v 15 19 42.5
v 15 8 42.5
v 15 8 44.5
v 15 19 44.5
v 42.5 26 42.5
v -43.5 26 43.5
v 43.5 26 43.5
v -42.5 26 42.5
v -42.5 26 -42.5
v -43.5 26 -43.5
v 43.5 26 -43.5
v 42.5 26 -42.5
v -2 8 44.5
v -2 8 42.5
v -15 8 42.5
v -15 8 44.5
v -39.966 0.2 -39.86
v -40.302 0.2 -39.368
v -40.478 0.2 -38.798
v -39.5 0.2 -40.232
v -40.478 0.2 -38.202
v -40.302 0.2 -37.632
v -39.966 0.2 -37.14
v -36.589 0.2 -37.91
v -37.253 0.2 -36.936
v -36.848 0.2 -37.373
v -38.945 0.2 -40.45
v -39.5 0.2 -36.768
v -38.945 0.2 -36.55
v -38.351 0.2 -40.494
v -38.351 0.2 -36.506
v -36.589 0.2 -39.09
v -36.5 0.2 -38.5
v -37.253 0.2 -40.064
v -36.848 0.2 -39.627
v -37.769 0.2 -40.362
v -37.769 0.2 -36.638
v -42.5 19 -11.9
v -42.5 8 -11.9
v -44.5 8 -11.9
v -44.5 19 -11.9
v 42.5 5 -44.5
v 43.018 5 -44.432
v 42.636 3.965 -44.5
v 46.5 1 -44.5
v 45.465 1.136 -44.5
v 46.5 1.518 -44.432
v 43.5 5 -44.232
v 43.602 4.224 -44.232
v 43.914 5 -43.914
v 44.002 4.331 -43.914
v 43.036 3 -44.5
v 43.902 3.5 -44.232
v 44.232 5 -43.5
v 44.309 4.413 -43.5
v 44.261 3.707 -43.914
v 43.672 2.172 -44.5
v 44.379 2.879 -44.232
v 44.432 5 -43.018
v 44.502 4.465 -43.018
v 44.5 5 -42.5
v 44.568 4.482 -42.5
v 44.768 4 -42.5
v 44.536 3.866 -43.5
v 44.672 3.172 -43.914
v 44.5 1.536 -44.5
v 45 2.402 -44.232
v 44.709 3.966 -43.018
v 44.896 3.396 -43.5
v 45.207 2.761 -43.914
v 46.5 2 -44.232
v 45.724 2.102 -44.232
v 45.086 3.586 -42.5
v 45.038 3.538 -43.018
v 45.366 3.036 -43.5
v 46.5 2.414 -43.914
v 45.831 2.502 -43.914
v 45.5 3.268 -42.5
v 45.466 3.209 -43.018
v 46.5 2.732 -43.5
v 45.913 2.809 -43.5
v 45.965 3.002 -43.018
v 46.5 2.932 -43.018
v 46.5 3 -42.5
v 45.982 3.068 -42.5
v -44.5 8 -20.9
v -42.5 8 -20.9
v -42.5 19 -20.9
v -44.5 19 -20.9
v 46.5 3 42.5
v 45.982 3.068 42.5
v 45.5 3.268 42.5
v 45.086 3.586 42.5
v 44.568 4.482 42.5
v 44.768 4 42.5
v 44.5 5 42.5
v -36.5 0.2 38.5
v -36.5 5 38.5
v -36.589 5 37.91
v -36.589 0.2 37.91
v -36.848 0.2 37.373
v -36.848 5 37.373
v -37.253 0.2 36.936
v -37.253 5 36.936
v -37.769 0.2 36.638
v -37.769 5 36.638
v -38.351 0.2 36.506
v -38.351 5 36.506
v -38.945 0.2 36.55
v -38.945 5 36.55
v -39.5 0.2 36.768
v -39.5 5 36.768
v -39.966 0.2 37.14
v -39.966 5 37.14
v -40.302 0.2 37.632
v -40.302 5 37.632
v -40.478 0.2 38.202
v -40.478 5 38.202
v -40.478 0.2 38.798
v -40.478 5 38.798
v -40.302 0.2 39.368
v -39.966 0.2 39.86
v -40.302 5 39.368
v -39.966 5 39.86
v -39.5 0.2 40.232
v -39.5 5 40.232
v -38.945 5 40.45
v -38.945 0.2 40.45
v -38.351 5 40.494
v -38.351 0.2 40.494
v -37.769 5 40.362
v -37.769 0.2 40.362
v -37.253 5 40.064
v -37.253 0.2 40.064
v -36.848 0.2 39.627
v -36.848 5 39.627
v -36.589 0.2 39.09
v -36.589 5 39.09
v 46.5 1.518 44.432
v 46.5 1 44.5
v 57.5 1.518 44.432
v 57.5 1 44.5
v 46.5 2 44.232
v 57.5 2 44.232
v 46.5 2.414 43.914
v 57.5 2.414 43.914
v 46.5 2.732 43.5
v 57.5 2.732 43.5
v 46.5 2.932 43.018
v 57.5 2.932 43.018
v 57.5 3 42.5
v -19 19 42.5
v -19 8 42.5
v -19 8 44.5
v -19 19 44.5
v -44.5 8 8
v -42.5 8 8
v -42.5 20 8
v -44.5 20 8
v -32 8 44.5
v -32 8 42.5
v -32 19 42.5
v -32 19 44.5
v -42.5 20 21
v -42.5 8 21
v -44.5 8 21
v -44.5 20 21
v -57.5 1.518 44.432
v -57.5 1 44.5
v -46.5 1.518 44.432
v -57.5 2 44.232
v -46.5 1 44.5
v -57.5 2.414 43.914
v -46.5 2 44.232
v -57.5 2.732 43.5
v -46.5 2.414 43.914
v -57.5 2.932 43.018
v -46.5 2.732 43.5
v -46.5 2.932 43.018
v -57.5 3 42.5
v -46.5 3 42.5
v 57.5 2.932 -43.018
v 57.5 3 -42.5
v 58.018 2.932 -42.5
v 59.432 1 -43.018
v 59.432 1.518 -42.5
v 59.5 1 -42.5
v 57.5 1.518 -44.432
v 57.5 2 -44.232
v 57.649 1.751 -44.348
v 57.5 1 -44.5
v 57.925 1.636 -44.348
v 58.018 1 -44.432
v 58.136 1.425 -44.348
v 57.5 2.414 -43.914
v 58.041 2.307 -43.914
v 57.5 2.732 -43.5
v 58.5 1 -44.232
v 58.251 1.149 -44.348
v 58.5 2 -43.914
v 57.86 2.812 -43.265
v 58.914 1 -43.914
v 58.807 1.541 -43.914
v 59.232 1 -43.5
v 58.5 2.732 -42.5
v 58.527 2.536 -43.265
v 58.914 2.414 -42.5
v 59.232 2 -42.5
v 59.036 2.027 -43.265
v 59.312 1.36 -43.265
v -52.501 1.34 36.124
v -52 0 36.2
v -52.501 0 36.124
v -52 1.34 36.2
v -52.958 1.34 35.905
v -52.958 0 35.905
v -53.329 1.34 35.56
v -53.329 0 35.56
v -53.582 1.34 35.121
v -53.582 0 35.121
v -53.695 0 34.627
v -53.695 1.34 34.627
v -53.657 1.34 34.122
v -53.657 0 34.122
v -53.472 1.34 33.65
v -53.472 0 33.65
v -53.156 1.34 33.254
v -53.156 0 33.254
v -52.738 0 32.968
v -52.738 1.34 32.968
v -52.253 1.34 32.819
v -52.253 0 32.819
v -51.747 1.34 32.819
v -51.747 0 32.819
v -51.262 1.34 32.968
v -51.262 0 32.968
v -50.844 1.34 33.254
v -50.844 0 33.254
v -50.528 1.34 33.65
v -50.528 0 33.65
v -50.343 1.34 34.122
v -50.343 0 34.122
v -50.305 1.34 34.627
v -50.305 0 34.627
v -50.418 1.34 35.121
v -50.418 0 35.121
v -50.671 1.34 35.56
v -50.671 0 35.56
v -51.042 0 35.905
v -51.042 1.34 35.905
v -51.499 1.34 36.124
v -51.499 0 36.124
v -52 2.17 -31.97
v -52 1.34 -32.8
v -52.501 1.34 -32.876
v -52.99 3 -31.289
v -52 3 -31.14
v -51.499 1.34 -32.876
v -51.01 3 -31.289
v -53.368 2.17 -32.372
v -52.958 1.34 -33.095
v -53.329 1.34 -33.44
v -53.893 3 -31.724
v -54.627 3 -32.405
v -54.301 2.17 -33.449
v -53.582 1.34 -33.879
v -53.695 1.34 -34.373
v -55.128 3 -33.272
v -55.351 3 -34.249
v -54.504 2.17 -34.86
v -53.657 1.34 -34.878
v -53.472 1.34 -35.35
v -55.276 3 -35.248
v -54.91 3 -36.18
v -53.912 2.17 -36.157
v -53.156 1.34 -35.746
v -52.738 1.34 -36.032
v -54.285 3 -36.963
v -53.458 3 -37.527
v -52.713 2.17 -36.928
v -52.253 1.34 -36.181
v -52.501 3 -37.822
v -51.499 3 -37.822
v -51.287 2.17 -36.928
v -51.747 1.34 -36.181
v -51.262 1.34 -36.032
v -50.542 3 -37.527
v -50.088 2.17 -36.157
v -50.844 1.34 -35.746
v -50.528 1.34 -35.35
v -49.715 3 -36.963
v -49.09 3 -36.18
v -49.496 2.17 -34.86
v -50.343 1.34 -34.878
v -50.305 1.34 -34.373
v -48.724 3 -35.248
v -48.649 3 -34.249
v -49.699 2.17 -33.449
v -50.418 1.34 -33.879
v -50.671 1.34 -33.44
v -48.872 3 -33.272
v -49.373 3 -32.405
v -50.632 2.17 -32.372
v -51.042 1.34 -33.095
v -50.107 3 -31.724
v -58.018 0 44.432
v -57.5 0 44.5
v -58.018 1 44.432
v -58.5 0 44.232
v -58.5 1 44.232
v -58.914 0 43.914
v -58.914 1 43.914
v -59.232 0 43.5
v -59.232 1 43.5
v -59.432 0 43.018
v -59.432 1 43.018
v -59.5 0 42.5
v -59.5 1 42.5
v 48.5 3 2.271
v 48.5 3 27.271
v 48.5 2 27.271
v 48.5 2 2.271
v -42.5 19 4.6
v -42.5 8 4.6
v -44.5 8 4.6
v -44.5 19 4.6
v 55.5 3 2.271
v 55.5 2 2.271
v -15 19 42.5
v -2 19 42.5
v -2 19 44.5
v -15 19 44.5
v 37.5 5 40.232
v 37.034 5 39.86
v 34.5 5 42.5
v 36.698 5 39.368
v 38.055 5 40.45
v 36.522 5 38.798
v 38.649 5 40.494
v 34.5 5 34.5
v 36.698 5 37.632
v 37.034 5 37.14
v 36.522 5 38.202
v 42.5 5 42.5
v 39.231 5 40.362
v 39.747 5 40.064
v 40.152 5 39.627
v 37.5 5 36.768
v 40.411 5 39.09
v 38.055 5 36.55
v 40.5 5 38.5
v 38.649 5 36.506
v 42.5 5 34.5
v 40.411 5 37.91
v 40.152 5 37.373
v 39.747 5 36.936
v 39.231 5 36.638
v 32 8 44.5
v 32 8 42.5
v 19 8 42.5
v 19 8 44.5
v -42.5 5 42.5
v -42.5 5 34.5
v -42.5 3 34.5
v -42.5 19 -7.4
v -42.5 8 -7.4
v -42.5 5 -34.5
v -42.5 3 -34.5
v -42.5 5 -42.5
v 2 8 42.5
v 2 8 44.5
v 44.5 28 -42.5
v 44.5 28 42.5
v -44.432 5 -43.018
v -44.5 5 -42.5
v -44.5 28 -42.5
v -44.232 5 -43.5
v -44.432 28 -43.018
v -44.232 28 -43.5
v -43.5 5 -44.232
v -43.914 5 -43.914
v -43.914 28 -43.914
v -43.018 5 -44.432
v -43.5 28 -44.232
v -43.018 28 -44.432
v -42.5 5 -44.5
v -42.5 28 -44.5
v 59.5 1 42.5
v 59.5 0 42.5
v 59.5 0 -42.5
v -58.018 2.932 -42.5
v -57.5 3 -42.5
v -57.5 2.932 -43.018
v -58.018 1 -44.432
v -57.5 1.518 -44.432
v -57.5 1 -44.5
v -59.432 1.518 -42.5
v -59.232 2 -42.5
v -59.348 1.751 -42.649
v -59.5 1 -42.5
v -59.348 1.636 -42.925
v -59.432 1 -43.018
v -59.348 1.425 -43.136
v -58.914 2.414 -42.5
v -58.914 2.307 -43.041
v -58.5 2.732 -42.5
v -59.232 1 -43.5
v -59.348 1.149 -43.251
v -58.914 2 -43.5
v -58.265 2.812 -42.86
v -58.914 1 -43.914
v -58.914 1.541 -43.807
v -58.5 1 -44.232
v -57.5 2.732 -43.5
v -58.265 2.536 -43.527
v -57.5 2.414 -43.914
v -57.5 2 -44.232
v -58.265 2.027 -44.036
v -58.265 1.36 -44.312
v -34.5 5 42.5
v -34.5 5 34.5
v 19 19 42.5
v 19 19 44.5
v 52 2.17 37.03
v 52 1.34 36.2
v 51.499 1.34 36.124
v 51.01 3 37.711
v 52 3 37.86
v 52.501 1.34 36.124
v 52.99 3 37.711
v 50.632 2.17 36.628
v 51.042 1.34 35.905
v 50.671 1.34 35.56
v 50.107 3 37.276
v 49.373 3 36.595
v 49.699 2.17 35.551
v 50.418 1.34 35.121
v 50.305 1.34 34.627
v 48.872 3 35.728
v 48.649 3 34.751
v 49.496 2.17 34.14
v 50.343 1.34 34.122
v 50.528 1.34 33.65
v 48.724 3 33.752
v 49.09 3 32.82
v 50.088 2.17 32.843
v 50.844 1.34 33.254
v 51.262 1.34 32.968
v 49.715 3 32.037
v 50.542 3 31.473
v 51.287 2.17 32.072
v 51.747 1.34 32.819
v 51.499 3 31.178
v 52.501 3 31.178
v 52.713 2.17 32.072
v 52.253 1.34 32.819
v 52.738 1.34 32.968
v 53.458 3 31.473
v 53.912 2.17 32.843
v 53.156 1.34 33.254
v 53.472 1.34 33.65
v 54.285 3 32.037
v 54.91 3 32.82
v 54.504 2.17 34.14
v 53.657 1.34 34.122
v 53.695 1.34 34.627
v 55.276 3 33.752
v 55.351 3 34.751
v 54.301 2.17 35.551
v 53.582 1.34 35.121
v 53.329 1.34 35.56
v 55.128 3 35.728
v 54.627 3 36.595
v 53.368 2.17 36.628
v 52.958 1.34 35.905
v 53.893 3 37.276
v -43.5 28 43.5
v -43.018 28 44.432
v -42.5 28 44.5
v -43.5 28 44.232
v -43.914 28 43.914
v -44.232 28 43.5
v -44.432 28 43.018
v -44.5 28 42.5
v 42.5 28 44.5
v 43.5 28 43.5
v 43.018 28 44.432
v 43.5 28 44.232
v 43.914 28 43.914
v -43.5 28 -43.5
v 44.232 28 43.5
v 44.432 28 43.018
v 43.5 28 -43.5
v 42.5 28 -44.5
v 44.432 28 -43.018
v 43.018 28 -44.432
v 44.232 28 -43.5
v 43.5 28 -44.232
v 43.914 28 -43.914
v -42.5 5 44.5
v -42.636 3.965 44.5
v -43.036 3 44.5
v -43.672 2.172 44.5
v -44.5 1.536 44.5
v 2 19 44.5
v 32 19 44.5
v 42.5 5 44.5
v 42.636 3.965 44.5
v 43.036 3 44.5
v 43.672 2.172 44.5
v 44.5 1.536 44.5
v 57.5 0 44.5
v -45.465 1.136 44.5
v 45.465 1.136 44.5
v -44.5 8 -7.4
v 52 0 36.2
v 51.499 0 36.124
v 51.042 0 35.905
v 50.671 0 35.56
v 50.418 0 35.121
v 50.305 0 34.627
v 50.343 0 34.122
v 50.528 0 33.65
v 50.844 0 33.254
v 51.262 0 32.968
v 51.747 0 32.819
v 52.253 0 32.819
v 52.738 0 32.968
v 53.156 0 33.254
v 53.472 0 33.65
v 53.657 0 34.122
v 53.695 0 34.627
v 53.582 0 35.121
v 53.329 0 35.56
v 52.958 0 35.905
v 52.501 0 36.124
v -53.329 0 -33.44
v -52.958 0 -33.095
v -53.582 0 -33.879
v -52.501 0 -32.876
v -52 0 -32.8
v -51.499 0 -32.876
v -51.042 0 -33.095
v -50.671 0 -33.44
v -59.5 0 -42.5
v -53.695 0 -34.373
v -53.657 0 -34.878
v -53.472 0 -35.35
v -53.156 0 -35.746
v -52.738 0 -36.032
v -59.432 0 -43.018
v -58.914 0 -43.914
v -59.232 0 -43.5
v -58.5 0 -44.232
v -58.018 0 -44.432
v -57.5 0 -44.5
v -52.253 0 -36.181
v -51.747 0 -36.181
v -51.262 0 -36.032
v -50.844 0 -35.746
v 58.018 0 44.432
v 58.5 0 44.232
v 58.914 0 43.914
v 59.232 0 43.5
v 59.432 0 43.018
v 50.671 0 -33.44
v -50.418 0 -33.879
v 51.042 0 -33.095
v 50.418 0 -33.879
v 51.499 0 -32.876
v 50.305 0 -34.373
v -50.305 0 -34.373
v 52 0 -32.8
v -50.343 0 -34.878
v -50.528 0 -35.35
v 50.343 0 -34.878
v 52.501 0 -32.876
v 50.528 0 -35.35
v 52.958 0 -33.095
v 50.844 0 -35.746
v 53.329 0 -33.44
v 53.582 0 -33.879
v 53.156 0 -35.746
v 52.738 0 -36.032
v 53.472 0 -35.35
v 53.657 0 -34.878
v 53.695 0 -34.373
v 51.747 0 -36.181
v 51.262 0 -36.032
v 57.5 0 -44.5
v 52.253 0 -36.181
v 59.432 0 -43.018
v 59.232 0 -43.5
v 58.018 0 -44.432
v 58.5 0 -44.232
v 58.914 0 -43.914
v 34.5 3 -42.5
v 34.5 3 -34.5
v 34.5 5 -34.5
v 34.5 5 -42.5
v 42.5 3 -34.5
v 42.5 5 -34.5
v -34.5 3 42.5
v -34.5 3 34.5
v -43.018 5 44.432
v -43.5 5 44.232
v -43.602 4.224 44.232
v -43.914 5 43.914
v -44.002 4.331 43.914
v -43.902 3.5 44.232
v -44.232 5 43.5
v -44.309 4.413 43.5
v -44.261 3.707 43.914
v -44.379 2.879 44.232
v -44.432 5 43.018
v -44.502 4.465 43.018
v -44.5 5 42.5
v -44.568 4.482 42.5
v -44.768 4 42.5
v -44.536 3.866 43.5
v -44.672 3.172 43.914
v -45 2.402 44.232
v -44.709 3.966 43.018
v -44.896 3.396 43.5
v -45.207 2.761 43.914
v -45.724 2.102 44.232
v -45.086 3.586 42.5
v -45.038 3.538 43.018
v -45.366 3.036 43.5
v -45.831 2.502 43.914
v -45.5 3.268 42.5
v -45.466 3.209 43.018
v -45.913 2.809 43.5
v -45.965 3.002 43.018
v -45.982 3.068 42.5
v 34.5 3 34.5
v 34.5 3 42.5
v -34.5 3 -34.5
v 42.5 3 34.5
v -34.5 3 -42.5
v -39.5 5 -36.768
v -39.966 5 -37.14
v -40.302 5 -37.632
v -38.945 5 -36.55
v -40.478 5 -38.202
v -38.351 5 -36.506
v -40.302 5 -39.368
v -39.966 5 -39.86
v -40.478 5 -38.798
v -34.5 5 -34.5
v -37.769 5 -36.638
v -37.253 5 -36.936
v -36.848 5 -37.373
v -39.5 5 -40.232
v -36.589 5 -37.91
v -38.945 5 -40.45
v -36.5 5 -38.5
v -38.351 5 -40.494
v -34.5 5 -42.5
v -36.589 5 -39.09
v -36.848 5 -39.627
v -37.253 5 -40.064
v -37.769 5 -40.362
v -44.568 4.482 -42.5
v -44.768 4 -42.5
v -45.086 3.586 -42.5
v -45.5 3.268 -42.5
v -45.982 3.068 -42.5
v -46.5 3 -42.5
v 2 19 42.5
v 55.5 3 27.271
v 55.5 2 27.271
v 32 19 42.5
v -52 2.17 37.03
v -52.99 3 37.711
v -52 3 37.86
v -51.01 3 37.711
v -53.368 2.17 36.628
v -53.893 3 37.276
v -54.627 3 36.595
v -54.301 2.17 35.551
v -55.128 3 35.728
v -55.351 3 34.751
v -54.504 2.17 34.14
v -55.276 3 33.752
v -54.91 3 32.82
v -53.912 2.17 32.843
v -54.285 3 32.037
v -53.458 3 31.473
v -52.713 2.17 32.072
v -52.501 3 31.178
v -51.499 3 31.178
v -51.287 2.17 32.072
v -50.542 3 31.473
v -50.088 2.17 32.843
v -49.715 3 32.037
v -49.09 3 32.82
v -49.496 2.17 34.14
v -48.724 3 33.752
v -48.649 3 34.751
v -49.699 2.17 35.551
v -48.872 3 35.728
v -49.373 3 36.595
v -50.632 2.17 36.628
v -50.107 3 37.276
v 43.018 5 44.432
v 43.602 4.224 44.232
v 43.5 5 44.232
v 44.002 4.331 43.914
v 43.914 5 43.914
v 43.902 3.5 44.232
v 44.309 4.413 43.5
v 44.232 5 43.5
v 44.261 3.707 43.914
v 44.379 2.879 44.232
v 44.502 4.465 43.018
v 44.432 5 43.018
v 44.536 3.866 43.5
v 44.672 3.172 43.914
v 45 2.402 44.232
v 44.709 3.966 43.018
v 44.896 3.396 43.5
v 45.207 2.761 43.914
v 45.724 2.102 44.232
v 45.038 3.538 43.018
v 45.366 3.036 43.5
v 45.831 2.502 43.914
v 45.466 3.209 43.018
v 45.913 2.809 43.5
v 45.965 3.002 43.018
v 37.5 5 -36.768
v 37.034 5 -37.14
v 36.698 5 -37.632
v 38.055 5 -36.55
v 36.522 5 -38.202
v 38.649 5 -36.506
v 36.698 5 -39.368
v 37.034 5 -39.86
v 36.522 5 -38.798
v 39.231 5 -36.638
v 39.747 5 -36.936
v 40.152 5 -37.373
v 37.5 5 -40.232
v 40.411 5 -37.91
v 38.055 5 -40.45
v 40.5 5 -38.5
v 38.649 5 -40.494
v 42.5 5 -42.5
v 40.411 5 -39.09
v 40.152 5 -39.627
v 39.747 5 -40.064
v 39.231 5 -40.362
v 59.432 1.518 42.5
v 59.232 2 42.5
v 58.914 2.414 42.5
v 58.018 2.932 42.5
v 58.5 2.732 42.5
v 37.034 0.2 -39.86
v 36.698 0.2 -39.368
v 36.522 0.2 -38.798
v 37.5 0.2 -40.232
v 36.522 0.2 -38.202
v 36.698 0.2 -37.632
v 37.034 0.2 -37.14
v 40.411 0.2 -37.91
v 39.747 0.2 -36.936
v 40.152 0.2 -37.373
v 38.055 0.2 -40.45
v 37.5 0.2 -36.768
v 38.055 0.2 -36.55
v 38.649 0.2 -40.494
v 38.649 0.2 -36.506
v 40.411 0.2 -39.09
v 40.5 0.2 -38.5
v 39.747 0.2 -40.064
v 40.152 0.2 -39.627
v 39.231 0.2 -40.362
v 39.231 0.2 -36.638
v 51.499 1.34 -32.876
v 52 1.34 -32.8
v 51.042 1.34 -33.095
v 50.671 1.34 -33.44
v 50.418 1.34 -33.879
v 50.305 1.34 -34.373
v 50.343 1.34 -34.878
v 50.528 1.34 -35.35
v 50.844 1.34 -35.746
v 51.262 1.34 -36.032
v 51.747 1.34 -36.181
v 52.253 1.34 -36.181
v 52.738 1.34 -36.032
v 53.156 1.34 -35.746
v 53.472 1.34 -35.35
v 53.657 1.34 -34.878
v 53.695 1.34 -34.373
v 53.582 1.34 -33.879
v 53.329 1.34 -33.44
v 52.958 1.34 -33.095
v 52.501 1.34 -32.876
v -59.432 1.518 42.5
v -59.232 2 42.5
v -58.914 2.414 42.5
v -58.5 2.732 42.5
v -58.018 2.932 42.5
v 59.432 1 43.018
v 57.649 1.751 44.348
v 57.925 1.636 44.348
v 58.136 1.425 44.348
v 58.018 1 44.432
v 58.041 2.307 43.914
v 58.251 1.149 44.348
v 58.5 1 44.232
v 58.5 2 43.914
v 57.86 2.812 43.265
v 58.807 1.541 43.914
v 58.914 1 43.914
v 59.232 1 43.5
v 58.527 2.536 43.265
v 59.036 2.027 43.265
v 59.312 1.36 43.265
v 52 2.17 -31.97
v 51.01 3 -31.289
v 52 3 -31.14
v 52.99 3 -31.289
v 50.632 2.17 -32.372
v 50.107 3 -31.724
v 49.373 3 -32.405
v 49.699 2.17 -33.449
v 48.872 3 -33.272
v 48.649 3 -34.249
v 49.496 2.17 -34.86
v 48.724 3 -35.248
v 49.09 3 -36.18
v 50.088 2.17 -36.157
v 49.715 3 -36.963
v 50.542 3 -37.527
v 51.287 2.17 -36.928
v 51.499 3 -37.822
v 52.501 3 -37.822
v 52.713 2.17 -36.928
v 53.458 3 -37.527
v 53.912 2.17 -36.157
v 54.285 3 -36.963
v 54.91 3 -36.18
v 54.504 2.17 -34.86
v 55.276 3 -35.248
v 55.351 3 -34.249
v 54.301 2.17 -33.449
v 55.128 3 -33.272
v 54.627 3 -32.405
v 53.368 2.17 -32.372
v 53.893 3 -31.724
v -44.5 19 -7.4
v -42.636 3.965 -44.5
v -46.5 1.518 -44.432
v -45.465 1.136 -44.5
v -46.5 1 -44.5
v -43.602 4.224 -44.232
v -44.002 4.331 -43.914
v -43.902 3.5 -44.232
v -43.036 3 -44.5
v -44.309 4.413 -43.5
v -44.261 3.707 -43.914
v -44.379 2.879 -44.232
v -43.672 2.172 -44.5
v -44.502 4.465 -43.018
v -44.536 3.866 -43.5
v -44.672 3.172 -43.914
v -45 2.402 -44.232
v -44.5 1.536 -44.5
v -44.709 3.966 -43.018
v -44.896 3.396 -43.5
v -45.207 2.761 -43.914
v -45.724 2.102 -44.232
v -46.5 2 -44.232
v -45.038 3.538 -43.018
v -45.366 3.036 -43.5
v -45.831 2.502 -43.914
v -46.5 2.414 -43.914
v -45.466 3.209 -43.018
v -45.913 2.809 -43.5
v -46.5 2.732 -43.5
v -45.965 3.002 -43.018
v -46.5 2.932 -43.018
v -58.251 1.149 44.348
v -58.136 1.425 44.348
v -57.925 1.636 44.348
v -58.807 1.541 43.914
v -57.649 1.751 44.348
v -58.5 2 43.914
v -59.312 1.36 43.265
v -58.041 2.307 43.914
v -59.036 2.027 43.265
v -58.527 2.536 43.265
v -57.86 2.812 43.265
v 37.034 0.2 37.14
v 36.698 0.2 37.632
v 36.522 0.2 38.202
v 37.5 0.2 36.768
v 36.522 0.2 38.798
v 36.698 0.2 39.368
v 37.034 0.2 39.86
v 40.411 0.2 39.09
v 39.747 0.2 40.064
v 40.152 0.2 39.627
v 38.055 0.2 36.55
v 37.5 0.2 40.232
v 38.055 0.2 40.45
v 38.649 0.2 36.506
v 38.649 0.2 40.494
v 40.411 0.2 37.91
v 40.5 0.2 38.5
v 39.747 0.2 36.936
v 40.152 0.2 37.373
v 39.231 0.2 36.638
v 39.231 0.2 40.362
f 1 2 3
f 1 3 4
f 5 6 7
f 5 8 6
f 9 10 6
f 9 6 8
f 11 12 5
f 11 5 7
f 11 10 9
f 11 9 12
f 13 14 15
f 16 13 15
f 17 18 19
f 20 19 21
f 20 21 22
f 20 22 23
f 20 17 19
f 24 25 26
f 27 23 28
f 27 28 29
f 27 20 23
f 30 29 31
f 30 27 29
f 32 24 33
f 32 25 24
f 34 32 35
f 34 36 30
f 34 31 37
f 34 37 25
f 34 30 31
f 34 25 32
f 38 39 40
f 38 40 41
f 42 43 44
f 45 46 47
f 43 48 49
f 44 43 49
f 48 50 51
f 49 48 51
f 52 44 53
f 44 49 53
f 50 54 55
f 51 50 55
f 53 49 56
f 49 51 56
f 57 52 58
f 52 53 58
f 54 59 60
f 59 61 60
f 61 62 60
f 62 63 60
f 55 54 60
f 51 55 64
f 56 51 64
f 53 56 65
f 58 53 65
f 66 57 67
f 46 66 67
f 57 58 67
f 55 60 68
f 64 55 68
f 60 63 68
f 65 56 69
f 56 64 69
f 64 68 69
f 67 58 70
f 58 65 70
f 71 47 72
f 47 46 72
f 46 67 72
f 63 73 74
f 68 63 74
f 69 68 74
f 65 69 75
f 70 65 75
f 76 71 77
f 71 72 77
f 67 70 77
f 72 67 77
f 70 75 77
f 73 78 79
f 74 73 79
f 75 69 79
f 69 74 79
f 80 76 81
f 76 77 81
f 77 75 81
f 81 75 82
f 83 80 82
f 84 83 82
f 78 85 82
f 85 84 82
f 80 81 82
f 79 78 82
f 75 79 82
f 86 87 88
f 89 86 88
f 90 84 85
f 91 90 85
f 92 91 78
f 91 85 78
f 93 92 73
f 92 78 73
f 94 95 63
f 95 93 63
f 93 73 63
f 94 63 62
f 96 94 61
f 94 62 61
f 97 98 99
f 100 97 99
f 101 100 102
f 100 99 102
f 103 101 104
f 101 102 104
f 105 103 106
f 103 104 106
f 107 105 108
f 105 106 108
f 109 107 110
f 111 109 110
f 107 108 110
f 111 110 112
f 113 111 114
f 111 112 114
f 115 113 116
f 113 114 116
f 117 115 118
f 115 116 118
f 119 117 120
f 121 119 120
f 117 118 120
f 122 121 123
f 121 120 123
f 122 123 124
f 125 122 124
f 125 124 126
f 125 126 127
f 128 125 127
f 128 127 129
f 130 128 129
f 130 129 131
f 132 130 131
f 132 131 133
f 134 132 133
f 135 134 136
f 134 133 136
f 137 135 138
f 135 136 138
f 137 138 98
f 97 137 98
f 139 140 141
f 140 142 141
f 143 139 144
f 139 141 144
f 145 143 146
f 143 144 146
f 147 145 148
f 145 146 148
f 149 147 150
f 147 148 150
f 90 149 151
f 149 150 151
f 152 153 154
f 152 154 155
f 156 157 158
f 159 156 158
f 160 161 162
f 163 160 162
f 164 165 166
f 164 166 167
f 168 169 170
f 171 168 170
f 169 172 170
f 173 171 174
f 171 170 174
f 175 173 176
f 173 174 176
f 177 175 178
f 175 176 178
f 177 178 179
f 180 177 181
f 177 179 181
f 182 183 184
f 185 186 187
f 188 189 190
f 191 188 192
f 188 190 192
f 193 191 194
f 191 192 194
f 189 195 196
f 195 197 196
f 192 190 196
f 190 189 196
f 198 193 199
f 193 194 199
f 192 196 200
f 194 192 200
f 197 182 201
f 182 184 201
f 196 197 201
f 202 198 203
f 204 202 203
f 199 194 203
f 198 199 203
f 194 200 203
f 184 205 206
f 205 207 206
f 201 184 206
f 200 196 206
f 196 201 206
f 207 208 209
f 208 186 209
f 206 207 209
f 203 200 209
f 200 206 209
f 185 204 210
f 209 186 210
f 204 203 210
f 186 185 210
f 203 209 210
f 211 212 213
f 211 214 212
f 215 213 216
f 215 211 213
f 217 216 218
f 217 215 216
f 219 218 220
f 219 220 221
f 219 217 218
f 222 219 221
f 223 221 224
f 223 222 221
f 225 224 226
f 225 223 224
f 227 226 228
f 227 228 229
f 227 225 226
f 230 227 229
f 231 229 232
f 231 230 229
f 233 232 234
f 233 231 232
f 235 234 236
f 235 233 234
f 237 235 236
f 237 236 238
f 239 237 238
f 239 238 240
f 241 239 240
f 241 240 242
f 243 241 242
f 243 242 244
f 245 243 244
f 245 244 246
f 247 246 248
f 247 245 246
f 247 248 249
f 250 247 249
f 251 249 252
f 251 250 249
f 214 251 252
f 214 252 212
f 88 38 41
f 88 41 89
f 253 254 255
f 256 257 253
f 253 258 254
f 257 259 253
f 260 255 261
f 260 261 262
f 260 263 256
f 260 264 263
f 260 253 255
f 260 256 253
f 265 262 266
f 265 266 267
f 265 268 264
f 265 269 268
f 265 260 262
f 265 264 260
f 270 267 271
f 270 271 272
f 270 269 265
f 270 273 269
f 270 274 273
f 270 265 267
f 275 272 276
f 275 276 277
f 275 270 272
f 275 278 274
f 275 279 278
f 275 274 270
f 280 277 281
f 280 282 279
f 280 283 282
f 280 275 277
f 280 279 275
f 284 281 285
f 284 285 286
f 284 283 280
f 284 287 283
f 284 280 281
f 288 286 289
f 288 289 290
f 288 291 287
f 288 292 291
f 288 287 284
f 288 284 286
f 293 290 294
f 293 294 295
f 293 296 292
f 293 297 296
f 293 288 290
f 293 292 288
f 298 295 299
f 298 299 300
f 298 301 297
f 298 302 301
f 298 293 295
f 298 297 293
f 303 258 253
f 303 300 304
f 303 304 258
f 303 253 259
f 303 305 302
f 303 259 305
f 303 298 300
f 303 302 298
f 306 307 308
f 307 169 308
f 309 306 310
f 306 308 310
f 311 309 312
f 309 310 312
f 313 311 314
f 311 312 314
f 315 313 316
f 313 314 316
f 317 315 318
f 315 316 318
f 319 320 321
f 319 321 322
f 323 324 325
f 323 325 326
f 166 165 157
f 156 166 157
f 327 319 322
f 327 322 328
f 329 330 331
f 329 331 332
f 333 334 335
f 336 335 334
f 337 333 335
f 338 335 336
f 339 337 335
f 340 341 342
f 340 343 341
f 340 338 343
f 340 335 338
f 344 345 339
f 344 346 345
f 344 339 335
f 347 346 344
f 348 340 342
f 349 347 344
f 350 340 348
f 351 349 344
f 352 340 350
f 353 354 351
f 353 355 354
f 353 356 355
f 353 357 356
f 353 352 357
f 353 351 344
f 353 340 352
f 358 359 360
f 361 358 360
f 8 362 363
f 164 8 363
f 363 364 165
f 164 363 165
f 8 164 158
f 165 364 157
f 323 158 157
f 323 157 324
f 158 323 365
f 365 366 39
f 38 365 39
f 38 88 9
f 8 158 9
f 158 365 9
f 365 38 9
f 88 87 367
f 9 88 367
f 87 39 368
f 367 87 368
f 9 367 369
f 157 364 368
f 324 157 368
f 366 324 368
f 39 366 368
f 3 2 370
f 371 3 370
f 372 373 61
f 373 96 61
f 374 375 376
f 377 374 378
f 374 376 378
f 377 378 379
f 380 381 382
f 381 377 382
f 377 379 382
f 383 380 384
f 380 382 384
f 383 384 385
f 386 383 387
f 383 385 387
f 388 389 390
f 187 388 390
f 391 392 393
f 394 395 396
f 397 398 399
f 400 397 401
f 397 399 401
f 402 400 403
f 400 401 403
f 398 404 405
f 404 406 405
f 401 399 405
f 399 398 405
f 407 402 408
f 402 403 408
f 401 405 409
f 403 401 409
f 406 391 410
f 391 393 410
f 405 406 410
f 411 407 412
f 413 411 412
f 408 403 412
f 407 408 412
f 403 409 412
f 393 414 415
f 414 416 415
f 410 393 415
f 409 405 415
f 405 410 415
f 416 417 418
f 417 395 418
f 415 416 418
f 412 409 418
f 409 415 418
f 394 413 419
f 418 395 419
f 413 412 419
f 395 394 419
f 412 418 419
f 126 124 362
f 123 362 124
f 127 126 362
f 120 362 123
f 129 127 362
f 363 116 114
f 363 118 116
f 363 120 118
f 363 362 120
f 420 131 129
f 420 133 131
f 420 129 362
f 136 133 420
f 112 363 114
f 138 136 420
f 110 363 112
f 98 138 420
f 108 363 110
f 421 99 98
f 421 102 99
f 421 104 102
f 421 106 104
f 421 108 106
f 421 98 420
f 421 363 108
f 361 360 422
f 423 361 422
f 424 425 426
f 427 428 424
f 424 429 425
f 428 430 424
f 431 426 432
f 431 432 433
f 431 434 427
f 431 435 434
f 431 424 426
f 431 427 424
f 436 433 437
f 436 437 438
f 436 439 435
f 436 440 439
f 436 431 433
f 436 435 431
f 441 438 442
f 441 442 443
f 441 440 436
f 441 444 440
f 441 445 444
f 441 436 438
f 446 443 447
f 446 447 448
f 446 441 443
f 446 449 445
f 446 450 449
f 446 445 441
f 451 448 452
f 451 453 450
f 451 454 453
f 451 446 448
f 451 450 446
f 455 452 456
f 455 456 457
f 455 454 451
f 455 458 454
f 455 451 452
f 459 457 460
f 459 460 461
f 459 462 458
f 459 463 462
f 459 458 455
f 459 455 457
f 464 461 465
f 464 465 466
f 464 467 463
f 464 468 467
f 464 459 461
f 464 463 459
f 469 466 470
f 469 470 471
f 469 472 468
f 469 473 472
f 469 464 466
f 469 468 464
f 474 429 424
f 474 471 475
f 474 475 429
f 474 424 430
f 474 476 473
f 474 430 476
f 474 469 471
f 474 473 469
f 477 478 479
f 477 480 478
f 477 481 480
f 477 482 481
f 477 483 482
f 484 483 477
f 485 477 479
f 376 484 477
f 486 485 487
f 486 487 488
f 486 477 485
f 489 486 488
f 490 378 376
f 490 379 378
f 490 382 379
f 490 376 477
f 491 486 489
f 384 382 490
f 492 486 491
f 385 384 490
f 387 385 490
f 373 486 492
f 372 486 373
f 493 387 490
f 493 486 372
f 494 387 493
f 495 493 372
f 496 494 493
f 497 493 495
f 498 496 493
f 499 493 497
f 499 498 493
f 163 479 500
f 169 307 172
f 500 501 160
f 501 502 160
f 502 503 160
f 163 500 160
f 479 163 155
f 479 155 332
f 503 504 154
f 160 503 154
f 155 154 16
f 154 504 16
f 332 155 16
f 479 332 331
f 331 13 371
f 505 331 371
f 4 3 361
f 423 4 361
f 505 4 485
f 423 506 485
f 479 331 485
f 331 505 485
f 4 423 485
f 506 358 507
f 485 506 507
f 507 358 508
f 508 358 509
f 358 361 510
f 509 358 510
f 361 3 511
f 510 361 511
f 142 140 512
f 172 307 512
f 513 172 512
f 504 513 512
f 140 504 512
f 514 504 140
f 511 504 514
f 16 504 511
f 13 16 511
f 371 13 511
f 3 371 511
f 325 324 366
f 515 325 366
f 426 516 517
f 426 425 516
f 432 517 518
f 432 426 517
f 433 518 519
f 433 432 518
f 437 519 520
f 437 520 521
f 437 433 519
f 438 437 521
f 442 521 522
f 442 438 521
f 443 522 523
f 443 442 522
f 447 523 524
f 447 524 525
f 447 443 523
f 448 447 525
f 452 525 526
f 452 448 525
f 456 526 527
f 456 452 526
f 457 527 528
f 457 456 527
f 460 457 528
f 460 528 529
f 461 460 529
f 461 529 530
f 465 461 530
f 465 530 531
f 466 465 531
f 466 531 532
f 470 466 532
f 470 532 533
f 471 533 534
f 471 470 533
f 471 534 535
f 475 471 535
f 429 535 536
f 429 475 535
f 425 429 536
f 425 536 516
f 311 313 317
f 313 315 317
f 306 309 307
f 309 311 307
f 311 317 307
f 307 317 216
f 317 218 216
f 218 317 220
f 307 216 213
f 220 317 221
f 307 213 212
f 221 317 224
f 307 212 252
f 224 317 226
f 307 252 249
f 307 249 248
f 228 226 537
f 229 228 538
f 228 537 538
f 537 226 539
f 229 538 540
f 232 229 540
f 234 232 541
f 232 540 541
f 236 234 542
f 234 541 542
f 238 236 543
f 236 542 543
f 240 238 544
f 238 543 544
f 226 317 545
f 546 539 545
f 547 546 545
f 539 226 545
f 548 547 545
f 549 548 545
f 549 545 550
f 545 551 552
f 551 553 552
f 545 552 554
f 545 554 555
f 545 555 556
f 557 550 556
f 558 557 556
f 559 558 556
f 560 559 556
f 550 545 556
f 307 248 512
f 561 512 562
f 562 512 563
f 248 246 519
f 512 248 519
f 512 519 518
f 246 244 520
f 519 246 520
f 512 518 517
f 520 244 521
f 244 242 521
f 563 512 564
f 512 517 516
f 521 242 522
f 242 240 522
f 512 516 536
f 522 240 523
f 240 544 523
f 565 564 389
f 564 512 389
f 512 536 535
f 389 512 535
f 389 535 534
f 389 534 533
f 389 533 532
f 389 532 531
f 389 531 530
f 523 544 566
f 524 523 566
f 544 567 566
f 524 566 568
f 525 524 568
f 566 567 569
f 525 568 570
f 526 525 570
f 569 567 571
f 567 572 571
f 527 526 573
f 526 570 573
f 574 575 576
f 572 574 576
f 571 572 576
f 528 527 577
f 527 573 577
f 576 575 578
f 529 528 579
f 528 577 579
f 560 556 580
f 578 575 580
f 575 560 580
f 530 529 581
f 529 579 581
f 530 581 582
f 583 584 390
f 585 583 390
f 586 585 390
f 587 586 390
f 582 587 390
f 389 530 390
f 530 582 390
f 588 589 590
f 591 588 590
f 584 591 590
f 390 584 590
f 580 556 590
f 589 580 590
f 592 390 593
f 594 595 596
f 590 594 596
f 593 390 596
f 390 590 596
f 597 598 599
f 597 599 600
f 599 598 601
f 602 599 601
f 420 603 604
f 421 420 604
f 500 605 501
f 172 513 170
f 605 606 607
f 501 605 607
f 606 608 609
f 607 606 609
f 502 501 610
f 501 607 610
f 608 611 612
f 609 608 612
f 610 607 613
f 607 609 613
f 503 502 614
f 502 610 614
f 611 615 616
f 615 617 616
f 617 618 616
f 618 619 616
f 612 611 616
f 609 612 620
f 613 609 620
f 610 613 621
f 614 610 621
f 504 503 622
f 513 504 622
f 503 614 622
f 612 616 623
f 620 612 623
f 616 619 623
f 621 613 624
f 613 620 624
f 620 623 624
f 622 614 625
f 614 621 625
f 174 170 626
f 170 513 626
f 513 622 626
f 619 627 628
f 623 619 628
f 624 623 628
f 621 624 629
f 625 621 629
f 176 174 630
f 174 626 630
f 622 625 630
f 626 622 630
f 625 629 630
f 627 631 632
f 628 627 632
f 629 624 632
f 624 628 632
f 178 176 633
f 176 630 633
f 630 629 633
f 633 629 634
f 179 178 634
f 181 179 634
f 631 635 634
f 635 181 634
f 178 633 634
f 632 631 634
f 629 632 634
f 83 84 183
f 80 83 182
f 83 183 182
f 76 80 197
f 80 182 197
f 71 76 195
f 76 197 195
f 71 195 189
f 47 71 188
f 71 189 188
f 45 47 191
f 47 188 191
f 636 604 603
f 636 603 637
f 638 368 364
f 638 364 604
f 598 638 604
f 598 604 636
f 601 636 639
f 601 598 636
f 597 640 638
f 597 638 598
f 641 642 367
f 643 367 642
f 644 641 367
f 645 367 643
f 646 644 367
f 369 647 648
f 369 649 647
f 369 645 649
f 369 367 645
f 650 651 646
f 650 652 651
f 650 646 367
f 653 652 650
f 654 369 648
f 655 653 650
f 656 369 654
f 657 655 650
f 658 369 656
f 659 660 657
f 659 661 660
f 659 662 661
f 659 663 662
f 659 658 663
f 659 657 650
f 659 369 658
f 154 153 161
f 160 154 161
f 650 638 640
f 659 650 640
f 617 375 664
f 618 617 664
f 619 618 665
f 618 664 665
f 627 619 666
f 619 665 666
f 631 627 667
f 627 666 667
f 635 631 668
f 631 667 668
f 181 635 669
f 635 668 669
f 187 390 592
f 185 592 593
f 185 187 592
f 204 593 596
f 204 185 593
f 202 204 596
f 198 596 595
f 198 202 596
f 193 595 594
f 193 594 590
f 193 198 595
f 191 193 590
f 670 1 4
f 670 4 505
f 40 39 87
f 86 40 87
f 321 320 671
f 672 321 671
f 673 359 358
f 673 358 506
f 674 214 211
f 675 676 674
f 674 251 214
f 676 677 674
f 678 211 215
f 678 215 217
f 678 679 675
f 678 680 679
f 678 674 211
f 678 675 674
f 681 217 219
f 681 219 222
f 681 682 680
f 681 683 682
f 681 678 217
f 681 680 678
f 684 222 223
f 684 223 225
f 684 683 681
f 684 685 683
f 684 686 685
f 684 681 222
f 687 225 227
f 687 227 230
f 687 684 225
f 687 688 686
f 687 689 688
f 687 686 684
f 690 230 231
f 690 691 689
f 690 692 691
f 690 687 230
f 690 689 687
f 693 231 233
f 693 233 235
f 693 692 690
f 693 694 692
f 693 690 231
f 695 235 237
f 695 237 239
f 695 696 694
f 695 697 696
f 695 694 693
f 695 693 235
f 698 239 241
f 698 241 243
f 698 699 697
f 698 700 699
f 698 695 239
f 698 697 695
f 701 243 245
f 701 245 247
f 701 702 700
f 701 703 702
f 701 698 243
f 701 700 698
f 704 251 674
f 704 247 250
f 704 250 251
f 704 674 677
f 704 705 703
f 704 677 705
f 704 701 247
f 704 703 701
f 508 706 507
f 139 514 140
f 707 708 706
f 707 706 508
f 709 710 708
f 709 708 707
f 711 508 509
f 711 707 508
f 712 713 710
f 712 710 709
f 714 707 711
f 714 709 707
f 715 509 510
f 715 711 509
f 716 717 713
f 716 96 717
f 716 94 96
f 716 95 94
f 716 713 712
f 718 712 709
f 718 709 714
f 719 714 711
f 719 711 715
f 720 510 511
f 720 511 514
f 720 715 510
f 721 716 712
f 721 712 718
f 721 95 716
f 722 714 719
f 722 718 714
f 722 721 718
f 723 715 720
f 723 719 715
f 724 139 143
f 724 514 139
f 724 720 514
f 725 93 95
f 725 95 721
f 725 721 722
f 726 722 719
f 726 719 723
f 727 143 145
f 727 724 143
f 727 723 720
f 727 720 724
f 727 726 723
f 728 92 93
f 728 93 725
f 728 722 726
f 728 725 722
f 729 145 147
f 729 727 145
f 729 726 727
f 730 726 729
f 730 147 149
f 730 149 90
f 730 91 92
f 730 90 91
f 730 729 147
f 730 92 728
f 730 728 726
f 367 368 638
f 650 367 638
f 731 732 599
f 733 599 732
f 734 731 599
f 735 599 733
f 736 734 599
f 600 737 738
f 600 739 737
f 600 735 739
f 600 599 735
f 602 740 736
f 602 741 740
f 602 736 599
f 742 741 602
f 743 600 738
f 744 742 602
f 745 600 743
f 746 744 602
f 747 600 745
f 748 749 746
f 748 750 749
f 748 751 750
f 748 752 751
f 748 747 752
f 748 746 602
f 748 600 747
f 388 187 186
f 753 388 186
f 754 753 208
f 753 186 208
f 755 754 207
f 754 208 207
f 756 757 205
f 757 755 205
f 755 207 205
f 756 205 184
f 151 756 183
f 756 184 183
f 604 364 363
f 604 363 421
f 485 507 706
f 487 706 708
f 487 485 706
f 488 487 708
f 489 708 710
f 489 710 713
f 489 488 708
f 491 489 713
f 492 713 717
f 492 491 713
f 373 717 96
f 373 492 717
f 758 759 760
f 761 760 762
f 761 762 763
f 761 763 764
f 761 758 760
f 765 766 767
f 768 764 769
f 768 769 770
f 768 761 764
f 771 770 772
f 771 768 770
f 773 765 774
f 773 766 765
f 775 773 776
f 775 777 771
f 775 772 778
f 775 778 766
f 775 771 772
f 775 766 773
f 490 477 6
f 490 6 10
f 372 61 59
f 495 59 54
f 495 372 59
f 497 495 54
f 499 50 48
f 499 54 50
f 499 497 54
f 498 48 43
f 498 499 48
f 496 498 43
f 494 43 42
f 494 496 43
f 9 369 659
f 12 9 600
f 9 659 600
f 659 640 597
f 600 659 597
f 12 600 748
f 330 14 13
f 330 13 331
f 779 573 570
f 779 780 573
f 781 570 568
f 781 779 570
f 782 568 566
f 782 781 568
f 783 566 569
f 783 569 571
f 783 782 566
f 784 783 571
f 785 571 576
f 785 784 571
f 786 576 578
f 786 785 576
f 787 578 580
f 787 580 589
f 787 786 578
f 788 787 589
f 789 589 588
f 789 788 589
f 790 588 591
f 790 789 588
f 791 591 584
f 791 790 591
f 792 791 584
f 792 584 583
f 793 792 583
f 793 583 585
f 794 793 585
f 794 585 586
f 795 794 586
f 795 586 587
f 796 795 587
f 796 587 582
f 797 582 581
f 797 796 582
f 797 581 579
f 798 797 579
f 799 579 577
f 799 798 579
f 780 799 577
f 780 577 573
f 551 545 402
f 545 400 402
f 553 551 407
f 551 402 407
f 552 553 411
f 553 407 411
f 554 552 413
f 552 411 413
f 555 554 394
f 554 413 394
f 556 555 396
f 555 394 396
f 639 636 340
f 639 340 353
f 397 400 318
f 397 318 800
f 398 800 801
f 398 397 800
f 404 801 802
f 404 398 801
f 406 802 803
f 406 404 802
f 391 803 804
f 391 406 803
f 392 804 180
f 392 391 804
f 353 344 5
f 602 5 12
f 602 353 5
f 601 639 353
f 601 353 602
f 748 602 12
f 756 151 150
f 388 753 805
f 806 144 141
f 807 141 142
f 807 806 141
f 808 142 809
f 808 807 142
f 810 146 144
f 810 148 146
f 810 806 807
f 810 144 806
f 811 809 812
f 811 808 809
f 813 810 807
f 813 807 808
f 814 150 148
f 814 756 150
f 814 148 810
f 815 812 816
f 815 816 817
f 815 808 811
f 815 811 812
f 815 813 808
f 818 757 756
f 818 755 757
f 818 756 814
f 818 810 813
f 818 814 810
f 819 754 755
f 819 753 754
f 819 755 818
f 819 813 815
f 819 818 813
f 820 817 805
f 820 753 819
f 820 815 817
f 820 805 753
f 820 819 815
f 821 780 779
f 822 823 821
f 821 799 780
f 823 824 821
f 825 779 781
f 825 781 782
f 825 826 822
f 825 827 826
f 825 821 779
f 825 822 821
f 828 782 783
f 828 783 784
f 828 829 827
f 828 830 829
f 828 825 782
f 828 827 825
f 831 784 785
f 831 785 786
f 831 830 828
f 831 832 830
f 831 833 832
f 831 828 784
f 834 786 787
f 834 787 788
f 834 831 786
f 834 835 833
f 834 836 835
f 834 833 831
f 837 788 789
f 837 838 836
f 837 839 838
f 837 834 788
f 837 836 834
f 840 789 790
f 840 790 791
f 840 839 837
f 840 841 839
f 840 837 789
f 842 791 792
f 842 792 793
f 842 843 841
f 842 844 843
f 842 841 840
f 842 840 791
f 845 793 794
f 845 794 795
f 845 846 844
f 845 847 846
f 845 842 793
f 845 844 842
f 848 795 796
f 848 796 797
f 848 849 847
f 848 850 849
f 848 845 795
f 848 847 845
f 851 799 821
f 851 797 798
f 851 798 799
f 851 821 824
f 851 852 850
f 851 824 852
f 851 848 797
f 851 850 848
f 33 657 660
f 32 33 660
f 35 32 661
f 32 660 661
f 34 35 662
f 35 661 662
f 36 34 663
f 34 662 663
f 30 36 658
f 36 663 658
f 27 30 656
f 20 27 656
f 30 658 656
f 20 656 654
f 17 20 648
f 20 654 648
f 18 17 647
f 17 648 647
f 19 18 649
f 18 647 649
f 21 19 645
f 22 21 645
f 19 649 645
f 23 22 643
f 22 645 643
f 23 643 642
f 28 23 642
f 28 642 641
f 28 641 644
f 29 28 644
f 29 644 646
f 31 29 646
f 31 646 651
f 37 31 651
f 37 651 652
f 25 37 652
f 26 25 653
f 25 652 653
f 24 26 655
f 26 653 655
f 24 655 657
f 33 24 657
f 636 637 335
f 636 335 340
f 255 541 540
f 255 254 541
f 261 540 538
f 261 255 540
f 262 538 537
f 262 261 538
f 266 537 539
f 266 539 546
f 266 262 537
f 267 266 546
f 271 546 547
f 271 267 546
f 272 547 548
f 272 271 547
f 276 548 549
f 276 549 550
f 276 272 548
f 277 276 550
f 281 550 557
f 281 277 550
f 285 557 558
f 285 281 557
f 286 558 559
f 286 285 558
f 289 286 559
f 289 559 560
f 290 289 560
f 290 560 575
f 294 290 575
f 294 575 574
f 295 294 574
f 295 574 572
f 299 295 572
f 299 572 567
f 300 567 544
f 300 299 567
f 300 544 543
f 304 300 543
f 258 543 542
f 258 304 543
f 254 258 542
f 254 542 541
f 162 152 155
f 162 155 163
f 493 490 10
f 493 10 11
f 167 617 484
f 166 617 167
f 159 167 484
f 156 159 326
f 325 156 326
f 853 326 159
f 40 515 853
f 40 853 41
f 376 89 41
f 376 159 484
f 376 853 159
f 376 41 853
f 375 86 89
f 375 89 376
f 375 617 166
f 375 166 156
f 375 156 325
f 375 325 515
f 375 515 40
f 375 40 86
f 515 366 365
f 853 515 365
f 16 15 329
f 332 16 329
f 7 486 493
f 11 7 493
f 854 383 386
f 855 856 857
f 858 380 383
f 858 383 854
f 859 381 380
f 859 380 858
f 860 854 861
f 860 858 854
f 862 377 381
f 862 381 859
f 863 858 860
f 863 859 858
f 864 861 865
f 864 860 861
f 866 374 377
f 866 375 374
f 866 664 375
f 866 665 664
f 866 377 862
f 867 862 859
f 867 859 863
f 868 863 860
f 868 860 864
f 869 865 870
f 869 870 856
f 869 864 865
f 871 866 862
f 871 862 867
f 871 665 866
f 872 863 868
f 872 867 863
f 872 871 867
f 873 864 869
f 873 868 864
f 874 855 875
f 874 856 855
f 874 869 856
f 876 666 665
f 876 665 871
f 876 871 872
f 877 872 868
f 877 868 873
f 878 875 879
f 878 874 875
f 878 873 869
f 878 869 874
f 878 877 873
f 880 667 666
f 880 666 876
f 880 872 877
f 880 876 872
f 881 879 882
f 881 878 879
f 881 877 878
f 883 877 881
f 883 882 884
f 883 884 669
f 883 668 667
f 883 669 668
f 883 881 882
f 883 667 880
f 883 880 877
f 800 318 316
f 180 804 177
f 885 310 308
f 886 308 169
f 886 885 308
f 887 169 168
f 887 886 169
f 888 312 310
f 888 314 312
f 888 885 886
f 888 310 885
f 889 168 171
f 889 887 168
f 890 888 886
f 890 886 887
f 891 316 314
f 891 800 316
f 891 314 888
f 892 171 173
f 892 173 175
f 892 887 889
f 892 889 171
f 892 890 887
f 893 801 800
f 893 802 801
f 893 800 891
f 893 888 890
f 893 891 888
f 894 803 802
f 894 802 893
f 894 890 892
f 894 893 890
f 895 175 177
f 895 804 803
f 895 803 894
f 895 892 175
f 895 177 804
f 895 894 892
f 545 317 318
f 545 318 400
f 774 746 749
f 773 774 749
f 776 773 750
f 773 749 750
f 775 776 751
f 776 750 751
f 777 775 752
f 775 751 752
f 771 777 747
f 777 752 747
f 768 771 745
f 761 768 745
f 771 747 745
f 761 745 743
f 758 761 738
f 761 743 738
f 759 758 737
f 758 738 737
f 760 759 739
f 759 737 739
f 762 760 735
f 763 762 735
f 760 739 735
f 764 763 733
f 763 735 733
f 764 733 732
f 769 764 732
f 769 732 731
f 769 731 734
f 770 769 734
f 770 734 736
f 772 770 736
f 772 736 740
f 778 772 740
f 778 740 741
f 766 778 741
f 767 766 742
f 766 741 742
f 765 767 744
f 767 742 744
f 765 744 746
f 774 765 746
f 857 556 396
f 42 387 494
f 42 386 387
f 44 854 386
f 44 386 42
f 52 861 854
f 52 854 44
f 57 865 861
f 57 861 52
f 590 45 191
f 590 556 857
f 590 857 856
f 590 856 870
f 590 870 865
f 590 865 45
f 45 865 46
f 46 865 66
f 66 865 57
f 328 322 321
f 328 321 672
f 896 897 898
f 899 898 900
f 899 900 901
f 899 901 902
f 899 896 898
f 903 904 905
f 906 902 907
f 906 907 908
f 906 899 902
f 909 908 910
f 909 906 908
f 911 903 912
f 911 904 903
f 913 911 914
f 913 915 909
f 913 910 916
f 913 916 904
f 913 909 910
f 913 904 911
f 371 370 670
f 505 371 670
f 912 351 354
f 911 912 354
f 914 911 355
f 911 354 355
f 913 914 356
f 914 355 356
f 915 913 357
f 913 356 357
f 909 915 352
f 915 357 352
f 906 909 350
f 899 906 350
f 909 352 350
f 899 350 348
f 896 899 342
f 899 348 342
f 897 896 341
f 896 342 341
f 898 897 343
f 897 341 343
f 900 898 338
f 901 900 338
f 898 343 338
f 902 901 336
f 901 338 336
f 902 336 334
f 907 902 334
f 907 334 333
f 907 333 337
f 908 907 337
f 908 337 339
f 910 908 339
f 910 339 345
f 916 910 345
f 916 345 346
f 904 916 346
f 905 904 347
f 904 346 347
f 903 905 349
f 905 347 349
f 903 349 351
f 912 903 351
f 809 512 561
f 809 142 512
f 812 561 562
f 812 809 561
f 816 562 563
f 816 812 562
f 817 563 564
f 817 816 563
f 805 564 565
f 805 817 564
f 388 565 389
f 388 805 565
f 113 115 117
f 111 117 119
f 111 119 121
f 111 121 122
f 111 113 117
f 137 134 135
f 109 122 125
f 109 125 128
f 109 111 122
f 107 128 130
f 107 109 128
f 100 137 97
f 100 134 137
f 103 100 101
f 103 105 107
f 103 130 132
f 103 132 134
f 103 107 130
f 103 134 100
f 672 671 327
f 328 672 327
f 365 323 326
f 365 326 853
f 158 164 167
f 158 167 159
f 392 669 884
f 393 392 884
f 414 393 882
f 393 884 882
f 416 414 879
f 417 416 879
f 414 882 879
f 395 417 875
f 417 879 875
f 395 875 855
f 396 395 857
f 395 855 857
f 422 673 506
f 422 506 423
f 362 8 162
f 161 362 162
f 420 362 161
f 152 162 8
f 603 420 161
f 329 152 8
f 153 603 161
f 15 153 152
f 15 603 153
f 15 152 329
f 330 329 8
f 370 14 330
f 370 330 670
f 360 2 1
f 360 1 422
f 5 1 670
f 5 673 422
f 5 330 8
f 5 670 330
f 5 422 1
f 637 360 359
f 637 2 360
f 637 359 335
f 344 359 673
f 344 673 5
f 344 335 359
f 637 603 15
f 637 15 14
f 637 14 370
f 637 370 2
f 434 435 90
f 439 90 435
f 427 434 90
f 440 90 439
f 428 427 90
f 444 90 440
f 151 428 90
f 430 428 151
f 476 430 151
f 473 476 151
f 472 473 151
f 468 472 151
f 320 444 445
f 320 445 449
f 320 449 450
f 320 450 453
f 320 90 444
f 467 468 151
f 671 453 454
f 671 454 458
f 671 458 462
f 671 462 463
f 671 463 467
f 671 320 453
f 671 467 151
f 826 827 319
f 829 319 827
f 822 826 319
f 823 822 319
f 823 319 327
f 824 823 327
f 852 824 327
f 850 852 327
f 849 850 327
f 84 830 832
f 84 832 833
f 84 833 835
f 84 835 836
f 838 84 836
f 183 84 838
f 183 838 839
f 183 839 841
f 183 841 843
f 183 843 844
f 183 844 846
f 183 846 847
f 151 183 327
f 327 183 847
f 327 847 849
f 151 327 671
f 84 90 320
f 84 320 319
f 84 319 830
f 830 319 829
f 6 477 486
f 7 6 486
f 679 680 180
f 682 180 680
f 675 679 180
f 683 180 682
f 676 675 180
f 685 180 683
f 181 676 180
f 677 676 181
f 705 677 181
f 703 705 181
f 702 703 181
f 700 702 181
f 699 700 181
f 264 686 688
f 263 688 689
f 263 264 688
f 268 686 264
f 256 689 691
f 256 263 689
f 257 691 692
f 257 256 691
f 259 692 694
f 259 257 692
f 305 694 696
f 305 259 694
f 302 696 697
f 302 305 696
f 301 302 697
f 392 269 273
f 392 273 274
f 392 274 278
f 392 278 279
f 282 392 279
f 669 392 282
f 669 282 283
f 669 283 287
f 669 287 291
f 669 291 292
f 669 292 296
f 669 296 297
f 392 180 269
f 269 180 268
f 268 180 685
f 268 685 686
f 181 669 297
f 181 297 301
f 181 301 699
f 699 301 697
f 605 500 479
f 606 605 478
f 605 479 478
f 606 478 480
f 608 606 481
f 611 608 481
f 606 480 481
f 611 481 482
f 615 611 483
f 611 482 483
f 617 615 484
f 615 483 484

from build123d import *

# Parameters (mm, degrees)
SKETCH1_W                    = 119
SKETCH1_H                    = 89
BOSS_EXTRUDE2_DEPTH          = 3
SKETCH3_W                    = 89
SKETCH3_H                    = 89
SKETCH3_W_2                  = 85
SKETCH3_H_2                  = 85
BOSS_EXTRUDE3_DEPTH          = 25
SKETCH4_W                    = 87
SKETCH4_H                    = 87
CUT_EXTRUDE1_DEPTH           = 2
SKETCH6_W                    = 8
SKETCH6_H                    = 8
BOSS_EXTRUDE4_DEPTH          = 2
SKETCH7_R                    = 2
CUT_EXTRUDE2_DEPTH           = 4.8
SKETCH8_W                    = 9
SKETCH8_H                    = 11
SKETCH8_W_2                  = 12
SKETCH8_W_3                  = 13
SKETCH8_H_2                  = 12
CUT_EXTRUDE3_DEPTH           = 2
SKETCH9_W                    = 13
SKETCH9_H                    = 11
CUT_EXTRUDE4_DEPTH           = 2
SKETCH10_R                   = 1.6
CUT_EXTRUDE5_DEPTH           = 3
SKETCH11_W                   = 7
SKETCH11_H                   = 25
CUT_EXTRUDE6_DEPTH           = 1
FILLET2_R                    = 2
CSK_FOR_M3_SFHCS1_AT_2_COUNT = 2
CSK_FOR_M3_SFHCS1_AT_2_PITCH = 69
CSK_FOR_M3_SFHCS1_AT_3_COUNT = 2
CSK_FOR_M3_SFHCS1_AT_3_PITCH = 124.807852317
CSK_FOR_M3_SFHCS1_AT_4_COUNT = 2
CSK_FOR_M3_SFHCS1_AT_4_PITCH = 104


with BuildPart() as part:
    # Sketch1 → Boss-Extrude2 (new body)
    with BuildSketch(Plane(origin=(0, 0, 0), x_dir=(1, 0, 0), z_dir=(0, 1, 0))):
        Rectangle(SKETCH1_W, SKETCH1_H)
    extrude(amount=BOSS_EXTRUDE2_DEPTH)

    # Sketch3 → Boss-Extrude3 (add)
    with BuildSketch(Plane(origin=(0, 3, 0), x_dir=(1, 0, 0), z_dir=(0, 1, 0))):
        Rectangle(SKETCH3_W, SKETCH3_H)
        Rectangle(SKETCH3_W_2, SKETCH3_H_2, mode=Mode.SUBTRACT)
    extrude(amount=BOSS_EXTRUDE3_DEPTH)

    # Sketch4 → Cut-Extrude1 (cut)
    with BuildSketch(Plane(origin=(0, 28, 0), x_dir=(1, 0, 0), z_dir=(0, 1, 0))):
        Rectangle(SKETCH4_W, SKETCH4_H)
    extrude(amount=-CUT_EXTRUDE1_DEPTH, mode=Mode.SUBTRACT)

    # Sketch6 → Boss-Extrude4 (add)
    with BuildSketch(Plane(origin=(0, 3, 0), x_dir=(1, 0, 0), z_dir=(0, 1, 0))):
        with Locations((-38.5, -38.5)):
            Rectangle(SKETCH6_W, SKETCH6_H)
        with Locations((-38.5, 38.5)):
            Rectangle(SKETCH6_W, SKETCH6_H)
        with Locations((38.5, 38.5)):
            Rectangle(SKETCH6_W, SKETCH6_H)
        with Locations((38.5, -38.5)):
            Rectangle(SKETCH6_W, SKETCH6_H)
    extrude(amount=BOSS_EXTRUDE4_DEPTH)

    # Sketch7 → Cut-Extrude2 (cut)
    with BuildSketch(Plane(origin=(0, 5, 0), x_dir=(1, 0, 0), z_dir=(0, 1, 0))):
        with Locations((-38.5, 38.5)):
            Circle(SKETCH7_R)
        with Locations((38.5, 38.5)):
            Circle(SKETCH7_R)
        with Locations((-38.5, -38.5)):
            Circle(SKETCH7_R)
        with Locations((38.5, -38.5)):
            Circle(SKETCH7_R)
    extrude(amount=-CUT_EXTRUDE2_DEPTH, mode=Mode.SUBTRACT)

    # Sketch8 → Cut-Extrude3 (cut)
    with BuildSketch(Plane(origin=(-42.5, 0, 0), x_dir=(0, 0, -1), z_dir=(1, 0, 0))):
        with Locations((16.4, 13.5)):
            Rectangle(SKETCH8_W, SKETCH8_H)
        with Locations((1.4, 13.5)):
            Rectangle(SKETCH8_W_2, SKETCH8_H)
        with Locations((-14.5, 14)):
            Rectangle(SKETCH8_W_3, SKETCH8_H_2)
    extrude(amount=-CUT_EXTRUDE3_DEPTH, mode=Mode.SUBTRACT)

    # Sketch9 → Cut-Extrude4 (cut)
    with BuildSketch(Plane(origin=(0, 0, 42.5), x_dir=(-1, 0, 0), z_dir=(0, 0, -1))):
        with Locations((8.5, 13.5)):
            Rectangle(SKETCH9_W, SKETCH9_H)
        with Locations((25.5, 13.5)):
            Rectangle(SKETCH9_W, SKETCH9_H)
        with Locations((-8.5, 13.5)):
            Rectangle(SKETCH9_W, SKETCH9_H)
        with Locations((-25.5, 13.5)):
            Rectangle(SKETCH9_W, SKETCH9_H)
    extrude(amount=-CUT_EXTRUDE4_DEPTH, mode=Mode.SUBTRACT)

    # Sketch10 → Cut-Extrude5 (cut)
    with BuildSketch(Plane(origin=(0, 3, 0), x_dir=(1, 0, 0), z_dir=(0, 1, 0))):
        with Locations((-52, 34.5)):
            Circle(SKETCH10_R)
        with Locations((-52, -34.5)):
            Circle(SKETCH10_R)
        with Locations((52, 34.5)):
            Circle(SKETCH10_R)
        with Locations((52, -34.5)):
            Circle(SKETCH10_R)
    extrude(amount=-CUT_EXTRUDE5_DEPTH, mode=Mode.SUBTRACT)

    # Sketch11 → Cut-Extrude6 (cut)
    with BuildSketch(Plane(origin=(0, 3, 0), x_dir=(1, 0, 0), z_dir=(0, 1, 0))):
        with Locations((52, -14.77145541)):
            Rectangle(SKETCH11_W, SKETCH11_H)
    extrude(amount=-CUT_EXTRUDE6_DEPTH, mode=Mode.SUBTRACT)

    # Fillet2
    fillet2_edges = [part.edges().sort_by_distance(p)[0] for p in [
        (59.5, 3, 0),
        (52, 3, 44.5),
        (-52, 3, -44.5),
        (52, 3, -44.5),
        (-44.5, 3, 0),
        (-44.5, 15.5, -44.5),
        (-44.5, 15.5, 44.5),
        (44.5, 3, 0),
        (44.5, 15.5, 44.5),
        (44.5, 15.5, -44.5),
        (-59.5, 3, 0),
        (-59.5, 1.5, -44.5),
        (59.5, 1.5, -44.5),
        (59.5, 1.5, 44.5),
        (-59.5, 1.5, 44.5),
        (-52, 3, 44.5),
    ]]
    fillet(fillet2_edges, radius=FILLET2_R)

    # Sketch13 → CSK for M3 SFHCS1 (revolve, cut)
    with BuildSketch(Plane(origin=(52, 3, -34.5), x_dir=(0, 0, 1), z_dir=(1, 0, 0))):
        Polygon((0, 0), (0, 3), (1.7, 3), (1.7, 1.66), (3.36, 0), align=None)
    csk_for_m3_sfhcs1 = revolve(axis=Axis((52, 9.35, -34.5), (0, -1, 0)), mode=Mode.SUBTRACT)

    # CSK for M3 SFHCS1 at 2: CSK for M3 SFHCS1 ×2
    with Locations(*[(0, 0, i * CSK_FOR_M3_SFHCS1_AT_2_PITCH) for i in range(1, CSK_FOR_M3_SFHCS1_AT_2_COUNT)]):
        add(csk_for_m3_sfhcs1, mode=Mode.SUBTRACT)

    # CSK for M3 SFHCS1 at 3: CSK for M3 SFHCS1 ×2
    with Locations(*[Vector(-0.833280904, 0, 0.552849831) * (i * CSK_FOR_M3_SFHCS1_AT_3_PITCH) for i in range(1, CSK_FOR_M3_SFHCS1_AT_3_COUNT)]):
        add(csk_for_m3_sfhcs1, mode=Mode.SUBTRACT)

    # CSK for M3 SFHCS1 at 4: CSK for M3 SFHCS1 ×2
    with Locations(*[(-i * CSK_FOR_M3_SFHCS1_AT_4_PITCH, 0, 0) for i in range(1, CSK_FOR_M3_SFHCS1_AT_4_COUNT)]):
        add(csk_for_m3_sfhcs1, mode=Mode.SUBTRACT)


solid = part.part
